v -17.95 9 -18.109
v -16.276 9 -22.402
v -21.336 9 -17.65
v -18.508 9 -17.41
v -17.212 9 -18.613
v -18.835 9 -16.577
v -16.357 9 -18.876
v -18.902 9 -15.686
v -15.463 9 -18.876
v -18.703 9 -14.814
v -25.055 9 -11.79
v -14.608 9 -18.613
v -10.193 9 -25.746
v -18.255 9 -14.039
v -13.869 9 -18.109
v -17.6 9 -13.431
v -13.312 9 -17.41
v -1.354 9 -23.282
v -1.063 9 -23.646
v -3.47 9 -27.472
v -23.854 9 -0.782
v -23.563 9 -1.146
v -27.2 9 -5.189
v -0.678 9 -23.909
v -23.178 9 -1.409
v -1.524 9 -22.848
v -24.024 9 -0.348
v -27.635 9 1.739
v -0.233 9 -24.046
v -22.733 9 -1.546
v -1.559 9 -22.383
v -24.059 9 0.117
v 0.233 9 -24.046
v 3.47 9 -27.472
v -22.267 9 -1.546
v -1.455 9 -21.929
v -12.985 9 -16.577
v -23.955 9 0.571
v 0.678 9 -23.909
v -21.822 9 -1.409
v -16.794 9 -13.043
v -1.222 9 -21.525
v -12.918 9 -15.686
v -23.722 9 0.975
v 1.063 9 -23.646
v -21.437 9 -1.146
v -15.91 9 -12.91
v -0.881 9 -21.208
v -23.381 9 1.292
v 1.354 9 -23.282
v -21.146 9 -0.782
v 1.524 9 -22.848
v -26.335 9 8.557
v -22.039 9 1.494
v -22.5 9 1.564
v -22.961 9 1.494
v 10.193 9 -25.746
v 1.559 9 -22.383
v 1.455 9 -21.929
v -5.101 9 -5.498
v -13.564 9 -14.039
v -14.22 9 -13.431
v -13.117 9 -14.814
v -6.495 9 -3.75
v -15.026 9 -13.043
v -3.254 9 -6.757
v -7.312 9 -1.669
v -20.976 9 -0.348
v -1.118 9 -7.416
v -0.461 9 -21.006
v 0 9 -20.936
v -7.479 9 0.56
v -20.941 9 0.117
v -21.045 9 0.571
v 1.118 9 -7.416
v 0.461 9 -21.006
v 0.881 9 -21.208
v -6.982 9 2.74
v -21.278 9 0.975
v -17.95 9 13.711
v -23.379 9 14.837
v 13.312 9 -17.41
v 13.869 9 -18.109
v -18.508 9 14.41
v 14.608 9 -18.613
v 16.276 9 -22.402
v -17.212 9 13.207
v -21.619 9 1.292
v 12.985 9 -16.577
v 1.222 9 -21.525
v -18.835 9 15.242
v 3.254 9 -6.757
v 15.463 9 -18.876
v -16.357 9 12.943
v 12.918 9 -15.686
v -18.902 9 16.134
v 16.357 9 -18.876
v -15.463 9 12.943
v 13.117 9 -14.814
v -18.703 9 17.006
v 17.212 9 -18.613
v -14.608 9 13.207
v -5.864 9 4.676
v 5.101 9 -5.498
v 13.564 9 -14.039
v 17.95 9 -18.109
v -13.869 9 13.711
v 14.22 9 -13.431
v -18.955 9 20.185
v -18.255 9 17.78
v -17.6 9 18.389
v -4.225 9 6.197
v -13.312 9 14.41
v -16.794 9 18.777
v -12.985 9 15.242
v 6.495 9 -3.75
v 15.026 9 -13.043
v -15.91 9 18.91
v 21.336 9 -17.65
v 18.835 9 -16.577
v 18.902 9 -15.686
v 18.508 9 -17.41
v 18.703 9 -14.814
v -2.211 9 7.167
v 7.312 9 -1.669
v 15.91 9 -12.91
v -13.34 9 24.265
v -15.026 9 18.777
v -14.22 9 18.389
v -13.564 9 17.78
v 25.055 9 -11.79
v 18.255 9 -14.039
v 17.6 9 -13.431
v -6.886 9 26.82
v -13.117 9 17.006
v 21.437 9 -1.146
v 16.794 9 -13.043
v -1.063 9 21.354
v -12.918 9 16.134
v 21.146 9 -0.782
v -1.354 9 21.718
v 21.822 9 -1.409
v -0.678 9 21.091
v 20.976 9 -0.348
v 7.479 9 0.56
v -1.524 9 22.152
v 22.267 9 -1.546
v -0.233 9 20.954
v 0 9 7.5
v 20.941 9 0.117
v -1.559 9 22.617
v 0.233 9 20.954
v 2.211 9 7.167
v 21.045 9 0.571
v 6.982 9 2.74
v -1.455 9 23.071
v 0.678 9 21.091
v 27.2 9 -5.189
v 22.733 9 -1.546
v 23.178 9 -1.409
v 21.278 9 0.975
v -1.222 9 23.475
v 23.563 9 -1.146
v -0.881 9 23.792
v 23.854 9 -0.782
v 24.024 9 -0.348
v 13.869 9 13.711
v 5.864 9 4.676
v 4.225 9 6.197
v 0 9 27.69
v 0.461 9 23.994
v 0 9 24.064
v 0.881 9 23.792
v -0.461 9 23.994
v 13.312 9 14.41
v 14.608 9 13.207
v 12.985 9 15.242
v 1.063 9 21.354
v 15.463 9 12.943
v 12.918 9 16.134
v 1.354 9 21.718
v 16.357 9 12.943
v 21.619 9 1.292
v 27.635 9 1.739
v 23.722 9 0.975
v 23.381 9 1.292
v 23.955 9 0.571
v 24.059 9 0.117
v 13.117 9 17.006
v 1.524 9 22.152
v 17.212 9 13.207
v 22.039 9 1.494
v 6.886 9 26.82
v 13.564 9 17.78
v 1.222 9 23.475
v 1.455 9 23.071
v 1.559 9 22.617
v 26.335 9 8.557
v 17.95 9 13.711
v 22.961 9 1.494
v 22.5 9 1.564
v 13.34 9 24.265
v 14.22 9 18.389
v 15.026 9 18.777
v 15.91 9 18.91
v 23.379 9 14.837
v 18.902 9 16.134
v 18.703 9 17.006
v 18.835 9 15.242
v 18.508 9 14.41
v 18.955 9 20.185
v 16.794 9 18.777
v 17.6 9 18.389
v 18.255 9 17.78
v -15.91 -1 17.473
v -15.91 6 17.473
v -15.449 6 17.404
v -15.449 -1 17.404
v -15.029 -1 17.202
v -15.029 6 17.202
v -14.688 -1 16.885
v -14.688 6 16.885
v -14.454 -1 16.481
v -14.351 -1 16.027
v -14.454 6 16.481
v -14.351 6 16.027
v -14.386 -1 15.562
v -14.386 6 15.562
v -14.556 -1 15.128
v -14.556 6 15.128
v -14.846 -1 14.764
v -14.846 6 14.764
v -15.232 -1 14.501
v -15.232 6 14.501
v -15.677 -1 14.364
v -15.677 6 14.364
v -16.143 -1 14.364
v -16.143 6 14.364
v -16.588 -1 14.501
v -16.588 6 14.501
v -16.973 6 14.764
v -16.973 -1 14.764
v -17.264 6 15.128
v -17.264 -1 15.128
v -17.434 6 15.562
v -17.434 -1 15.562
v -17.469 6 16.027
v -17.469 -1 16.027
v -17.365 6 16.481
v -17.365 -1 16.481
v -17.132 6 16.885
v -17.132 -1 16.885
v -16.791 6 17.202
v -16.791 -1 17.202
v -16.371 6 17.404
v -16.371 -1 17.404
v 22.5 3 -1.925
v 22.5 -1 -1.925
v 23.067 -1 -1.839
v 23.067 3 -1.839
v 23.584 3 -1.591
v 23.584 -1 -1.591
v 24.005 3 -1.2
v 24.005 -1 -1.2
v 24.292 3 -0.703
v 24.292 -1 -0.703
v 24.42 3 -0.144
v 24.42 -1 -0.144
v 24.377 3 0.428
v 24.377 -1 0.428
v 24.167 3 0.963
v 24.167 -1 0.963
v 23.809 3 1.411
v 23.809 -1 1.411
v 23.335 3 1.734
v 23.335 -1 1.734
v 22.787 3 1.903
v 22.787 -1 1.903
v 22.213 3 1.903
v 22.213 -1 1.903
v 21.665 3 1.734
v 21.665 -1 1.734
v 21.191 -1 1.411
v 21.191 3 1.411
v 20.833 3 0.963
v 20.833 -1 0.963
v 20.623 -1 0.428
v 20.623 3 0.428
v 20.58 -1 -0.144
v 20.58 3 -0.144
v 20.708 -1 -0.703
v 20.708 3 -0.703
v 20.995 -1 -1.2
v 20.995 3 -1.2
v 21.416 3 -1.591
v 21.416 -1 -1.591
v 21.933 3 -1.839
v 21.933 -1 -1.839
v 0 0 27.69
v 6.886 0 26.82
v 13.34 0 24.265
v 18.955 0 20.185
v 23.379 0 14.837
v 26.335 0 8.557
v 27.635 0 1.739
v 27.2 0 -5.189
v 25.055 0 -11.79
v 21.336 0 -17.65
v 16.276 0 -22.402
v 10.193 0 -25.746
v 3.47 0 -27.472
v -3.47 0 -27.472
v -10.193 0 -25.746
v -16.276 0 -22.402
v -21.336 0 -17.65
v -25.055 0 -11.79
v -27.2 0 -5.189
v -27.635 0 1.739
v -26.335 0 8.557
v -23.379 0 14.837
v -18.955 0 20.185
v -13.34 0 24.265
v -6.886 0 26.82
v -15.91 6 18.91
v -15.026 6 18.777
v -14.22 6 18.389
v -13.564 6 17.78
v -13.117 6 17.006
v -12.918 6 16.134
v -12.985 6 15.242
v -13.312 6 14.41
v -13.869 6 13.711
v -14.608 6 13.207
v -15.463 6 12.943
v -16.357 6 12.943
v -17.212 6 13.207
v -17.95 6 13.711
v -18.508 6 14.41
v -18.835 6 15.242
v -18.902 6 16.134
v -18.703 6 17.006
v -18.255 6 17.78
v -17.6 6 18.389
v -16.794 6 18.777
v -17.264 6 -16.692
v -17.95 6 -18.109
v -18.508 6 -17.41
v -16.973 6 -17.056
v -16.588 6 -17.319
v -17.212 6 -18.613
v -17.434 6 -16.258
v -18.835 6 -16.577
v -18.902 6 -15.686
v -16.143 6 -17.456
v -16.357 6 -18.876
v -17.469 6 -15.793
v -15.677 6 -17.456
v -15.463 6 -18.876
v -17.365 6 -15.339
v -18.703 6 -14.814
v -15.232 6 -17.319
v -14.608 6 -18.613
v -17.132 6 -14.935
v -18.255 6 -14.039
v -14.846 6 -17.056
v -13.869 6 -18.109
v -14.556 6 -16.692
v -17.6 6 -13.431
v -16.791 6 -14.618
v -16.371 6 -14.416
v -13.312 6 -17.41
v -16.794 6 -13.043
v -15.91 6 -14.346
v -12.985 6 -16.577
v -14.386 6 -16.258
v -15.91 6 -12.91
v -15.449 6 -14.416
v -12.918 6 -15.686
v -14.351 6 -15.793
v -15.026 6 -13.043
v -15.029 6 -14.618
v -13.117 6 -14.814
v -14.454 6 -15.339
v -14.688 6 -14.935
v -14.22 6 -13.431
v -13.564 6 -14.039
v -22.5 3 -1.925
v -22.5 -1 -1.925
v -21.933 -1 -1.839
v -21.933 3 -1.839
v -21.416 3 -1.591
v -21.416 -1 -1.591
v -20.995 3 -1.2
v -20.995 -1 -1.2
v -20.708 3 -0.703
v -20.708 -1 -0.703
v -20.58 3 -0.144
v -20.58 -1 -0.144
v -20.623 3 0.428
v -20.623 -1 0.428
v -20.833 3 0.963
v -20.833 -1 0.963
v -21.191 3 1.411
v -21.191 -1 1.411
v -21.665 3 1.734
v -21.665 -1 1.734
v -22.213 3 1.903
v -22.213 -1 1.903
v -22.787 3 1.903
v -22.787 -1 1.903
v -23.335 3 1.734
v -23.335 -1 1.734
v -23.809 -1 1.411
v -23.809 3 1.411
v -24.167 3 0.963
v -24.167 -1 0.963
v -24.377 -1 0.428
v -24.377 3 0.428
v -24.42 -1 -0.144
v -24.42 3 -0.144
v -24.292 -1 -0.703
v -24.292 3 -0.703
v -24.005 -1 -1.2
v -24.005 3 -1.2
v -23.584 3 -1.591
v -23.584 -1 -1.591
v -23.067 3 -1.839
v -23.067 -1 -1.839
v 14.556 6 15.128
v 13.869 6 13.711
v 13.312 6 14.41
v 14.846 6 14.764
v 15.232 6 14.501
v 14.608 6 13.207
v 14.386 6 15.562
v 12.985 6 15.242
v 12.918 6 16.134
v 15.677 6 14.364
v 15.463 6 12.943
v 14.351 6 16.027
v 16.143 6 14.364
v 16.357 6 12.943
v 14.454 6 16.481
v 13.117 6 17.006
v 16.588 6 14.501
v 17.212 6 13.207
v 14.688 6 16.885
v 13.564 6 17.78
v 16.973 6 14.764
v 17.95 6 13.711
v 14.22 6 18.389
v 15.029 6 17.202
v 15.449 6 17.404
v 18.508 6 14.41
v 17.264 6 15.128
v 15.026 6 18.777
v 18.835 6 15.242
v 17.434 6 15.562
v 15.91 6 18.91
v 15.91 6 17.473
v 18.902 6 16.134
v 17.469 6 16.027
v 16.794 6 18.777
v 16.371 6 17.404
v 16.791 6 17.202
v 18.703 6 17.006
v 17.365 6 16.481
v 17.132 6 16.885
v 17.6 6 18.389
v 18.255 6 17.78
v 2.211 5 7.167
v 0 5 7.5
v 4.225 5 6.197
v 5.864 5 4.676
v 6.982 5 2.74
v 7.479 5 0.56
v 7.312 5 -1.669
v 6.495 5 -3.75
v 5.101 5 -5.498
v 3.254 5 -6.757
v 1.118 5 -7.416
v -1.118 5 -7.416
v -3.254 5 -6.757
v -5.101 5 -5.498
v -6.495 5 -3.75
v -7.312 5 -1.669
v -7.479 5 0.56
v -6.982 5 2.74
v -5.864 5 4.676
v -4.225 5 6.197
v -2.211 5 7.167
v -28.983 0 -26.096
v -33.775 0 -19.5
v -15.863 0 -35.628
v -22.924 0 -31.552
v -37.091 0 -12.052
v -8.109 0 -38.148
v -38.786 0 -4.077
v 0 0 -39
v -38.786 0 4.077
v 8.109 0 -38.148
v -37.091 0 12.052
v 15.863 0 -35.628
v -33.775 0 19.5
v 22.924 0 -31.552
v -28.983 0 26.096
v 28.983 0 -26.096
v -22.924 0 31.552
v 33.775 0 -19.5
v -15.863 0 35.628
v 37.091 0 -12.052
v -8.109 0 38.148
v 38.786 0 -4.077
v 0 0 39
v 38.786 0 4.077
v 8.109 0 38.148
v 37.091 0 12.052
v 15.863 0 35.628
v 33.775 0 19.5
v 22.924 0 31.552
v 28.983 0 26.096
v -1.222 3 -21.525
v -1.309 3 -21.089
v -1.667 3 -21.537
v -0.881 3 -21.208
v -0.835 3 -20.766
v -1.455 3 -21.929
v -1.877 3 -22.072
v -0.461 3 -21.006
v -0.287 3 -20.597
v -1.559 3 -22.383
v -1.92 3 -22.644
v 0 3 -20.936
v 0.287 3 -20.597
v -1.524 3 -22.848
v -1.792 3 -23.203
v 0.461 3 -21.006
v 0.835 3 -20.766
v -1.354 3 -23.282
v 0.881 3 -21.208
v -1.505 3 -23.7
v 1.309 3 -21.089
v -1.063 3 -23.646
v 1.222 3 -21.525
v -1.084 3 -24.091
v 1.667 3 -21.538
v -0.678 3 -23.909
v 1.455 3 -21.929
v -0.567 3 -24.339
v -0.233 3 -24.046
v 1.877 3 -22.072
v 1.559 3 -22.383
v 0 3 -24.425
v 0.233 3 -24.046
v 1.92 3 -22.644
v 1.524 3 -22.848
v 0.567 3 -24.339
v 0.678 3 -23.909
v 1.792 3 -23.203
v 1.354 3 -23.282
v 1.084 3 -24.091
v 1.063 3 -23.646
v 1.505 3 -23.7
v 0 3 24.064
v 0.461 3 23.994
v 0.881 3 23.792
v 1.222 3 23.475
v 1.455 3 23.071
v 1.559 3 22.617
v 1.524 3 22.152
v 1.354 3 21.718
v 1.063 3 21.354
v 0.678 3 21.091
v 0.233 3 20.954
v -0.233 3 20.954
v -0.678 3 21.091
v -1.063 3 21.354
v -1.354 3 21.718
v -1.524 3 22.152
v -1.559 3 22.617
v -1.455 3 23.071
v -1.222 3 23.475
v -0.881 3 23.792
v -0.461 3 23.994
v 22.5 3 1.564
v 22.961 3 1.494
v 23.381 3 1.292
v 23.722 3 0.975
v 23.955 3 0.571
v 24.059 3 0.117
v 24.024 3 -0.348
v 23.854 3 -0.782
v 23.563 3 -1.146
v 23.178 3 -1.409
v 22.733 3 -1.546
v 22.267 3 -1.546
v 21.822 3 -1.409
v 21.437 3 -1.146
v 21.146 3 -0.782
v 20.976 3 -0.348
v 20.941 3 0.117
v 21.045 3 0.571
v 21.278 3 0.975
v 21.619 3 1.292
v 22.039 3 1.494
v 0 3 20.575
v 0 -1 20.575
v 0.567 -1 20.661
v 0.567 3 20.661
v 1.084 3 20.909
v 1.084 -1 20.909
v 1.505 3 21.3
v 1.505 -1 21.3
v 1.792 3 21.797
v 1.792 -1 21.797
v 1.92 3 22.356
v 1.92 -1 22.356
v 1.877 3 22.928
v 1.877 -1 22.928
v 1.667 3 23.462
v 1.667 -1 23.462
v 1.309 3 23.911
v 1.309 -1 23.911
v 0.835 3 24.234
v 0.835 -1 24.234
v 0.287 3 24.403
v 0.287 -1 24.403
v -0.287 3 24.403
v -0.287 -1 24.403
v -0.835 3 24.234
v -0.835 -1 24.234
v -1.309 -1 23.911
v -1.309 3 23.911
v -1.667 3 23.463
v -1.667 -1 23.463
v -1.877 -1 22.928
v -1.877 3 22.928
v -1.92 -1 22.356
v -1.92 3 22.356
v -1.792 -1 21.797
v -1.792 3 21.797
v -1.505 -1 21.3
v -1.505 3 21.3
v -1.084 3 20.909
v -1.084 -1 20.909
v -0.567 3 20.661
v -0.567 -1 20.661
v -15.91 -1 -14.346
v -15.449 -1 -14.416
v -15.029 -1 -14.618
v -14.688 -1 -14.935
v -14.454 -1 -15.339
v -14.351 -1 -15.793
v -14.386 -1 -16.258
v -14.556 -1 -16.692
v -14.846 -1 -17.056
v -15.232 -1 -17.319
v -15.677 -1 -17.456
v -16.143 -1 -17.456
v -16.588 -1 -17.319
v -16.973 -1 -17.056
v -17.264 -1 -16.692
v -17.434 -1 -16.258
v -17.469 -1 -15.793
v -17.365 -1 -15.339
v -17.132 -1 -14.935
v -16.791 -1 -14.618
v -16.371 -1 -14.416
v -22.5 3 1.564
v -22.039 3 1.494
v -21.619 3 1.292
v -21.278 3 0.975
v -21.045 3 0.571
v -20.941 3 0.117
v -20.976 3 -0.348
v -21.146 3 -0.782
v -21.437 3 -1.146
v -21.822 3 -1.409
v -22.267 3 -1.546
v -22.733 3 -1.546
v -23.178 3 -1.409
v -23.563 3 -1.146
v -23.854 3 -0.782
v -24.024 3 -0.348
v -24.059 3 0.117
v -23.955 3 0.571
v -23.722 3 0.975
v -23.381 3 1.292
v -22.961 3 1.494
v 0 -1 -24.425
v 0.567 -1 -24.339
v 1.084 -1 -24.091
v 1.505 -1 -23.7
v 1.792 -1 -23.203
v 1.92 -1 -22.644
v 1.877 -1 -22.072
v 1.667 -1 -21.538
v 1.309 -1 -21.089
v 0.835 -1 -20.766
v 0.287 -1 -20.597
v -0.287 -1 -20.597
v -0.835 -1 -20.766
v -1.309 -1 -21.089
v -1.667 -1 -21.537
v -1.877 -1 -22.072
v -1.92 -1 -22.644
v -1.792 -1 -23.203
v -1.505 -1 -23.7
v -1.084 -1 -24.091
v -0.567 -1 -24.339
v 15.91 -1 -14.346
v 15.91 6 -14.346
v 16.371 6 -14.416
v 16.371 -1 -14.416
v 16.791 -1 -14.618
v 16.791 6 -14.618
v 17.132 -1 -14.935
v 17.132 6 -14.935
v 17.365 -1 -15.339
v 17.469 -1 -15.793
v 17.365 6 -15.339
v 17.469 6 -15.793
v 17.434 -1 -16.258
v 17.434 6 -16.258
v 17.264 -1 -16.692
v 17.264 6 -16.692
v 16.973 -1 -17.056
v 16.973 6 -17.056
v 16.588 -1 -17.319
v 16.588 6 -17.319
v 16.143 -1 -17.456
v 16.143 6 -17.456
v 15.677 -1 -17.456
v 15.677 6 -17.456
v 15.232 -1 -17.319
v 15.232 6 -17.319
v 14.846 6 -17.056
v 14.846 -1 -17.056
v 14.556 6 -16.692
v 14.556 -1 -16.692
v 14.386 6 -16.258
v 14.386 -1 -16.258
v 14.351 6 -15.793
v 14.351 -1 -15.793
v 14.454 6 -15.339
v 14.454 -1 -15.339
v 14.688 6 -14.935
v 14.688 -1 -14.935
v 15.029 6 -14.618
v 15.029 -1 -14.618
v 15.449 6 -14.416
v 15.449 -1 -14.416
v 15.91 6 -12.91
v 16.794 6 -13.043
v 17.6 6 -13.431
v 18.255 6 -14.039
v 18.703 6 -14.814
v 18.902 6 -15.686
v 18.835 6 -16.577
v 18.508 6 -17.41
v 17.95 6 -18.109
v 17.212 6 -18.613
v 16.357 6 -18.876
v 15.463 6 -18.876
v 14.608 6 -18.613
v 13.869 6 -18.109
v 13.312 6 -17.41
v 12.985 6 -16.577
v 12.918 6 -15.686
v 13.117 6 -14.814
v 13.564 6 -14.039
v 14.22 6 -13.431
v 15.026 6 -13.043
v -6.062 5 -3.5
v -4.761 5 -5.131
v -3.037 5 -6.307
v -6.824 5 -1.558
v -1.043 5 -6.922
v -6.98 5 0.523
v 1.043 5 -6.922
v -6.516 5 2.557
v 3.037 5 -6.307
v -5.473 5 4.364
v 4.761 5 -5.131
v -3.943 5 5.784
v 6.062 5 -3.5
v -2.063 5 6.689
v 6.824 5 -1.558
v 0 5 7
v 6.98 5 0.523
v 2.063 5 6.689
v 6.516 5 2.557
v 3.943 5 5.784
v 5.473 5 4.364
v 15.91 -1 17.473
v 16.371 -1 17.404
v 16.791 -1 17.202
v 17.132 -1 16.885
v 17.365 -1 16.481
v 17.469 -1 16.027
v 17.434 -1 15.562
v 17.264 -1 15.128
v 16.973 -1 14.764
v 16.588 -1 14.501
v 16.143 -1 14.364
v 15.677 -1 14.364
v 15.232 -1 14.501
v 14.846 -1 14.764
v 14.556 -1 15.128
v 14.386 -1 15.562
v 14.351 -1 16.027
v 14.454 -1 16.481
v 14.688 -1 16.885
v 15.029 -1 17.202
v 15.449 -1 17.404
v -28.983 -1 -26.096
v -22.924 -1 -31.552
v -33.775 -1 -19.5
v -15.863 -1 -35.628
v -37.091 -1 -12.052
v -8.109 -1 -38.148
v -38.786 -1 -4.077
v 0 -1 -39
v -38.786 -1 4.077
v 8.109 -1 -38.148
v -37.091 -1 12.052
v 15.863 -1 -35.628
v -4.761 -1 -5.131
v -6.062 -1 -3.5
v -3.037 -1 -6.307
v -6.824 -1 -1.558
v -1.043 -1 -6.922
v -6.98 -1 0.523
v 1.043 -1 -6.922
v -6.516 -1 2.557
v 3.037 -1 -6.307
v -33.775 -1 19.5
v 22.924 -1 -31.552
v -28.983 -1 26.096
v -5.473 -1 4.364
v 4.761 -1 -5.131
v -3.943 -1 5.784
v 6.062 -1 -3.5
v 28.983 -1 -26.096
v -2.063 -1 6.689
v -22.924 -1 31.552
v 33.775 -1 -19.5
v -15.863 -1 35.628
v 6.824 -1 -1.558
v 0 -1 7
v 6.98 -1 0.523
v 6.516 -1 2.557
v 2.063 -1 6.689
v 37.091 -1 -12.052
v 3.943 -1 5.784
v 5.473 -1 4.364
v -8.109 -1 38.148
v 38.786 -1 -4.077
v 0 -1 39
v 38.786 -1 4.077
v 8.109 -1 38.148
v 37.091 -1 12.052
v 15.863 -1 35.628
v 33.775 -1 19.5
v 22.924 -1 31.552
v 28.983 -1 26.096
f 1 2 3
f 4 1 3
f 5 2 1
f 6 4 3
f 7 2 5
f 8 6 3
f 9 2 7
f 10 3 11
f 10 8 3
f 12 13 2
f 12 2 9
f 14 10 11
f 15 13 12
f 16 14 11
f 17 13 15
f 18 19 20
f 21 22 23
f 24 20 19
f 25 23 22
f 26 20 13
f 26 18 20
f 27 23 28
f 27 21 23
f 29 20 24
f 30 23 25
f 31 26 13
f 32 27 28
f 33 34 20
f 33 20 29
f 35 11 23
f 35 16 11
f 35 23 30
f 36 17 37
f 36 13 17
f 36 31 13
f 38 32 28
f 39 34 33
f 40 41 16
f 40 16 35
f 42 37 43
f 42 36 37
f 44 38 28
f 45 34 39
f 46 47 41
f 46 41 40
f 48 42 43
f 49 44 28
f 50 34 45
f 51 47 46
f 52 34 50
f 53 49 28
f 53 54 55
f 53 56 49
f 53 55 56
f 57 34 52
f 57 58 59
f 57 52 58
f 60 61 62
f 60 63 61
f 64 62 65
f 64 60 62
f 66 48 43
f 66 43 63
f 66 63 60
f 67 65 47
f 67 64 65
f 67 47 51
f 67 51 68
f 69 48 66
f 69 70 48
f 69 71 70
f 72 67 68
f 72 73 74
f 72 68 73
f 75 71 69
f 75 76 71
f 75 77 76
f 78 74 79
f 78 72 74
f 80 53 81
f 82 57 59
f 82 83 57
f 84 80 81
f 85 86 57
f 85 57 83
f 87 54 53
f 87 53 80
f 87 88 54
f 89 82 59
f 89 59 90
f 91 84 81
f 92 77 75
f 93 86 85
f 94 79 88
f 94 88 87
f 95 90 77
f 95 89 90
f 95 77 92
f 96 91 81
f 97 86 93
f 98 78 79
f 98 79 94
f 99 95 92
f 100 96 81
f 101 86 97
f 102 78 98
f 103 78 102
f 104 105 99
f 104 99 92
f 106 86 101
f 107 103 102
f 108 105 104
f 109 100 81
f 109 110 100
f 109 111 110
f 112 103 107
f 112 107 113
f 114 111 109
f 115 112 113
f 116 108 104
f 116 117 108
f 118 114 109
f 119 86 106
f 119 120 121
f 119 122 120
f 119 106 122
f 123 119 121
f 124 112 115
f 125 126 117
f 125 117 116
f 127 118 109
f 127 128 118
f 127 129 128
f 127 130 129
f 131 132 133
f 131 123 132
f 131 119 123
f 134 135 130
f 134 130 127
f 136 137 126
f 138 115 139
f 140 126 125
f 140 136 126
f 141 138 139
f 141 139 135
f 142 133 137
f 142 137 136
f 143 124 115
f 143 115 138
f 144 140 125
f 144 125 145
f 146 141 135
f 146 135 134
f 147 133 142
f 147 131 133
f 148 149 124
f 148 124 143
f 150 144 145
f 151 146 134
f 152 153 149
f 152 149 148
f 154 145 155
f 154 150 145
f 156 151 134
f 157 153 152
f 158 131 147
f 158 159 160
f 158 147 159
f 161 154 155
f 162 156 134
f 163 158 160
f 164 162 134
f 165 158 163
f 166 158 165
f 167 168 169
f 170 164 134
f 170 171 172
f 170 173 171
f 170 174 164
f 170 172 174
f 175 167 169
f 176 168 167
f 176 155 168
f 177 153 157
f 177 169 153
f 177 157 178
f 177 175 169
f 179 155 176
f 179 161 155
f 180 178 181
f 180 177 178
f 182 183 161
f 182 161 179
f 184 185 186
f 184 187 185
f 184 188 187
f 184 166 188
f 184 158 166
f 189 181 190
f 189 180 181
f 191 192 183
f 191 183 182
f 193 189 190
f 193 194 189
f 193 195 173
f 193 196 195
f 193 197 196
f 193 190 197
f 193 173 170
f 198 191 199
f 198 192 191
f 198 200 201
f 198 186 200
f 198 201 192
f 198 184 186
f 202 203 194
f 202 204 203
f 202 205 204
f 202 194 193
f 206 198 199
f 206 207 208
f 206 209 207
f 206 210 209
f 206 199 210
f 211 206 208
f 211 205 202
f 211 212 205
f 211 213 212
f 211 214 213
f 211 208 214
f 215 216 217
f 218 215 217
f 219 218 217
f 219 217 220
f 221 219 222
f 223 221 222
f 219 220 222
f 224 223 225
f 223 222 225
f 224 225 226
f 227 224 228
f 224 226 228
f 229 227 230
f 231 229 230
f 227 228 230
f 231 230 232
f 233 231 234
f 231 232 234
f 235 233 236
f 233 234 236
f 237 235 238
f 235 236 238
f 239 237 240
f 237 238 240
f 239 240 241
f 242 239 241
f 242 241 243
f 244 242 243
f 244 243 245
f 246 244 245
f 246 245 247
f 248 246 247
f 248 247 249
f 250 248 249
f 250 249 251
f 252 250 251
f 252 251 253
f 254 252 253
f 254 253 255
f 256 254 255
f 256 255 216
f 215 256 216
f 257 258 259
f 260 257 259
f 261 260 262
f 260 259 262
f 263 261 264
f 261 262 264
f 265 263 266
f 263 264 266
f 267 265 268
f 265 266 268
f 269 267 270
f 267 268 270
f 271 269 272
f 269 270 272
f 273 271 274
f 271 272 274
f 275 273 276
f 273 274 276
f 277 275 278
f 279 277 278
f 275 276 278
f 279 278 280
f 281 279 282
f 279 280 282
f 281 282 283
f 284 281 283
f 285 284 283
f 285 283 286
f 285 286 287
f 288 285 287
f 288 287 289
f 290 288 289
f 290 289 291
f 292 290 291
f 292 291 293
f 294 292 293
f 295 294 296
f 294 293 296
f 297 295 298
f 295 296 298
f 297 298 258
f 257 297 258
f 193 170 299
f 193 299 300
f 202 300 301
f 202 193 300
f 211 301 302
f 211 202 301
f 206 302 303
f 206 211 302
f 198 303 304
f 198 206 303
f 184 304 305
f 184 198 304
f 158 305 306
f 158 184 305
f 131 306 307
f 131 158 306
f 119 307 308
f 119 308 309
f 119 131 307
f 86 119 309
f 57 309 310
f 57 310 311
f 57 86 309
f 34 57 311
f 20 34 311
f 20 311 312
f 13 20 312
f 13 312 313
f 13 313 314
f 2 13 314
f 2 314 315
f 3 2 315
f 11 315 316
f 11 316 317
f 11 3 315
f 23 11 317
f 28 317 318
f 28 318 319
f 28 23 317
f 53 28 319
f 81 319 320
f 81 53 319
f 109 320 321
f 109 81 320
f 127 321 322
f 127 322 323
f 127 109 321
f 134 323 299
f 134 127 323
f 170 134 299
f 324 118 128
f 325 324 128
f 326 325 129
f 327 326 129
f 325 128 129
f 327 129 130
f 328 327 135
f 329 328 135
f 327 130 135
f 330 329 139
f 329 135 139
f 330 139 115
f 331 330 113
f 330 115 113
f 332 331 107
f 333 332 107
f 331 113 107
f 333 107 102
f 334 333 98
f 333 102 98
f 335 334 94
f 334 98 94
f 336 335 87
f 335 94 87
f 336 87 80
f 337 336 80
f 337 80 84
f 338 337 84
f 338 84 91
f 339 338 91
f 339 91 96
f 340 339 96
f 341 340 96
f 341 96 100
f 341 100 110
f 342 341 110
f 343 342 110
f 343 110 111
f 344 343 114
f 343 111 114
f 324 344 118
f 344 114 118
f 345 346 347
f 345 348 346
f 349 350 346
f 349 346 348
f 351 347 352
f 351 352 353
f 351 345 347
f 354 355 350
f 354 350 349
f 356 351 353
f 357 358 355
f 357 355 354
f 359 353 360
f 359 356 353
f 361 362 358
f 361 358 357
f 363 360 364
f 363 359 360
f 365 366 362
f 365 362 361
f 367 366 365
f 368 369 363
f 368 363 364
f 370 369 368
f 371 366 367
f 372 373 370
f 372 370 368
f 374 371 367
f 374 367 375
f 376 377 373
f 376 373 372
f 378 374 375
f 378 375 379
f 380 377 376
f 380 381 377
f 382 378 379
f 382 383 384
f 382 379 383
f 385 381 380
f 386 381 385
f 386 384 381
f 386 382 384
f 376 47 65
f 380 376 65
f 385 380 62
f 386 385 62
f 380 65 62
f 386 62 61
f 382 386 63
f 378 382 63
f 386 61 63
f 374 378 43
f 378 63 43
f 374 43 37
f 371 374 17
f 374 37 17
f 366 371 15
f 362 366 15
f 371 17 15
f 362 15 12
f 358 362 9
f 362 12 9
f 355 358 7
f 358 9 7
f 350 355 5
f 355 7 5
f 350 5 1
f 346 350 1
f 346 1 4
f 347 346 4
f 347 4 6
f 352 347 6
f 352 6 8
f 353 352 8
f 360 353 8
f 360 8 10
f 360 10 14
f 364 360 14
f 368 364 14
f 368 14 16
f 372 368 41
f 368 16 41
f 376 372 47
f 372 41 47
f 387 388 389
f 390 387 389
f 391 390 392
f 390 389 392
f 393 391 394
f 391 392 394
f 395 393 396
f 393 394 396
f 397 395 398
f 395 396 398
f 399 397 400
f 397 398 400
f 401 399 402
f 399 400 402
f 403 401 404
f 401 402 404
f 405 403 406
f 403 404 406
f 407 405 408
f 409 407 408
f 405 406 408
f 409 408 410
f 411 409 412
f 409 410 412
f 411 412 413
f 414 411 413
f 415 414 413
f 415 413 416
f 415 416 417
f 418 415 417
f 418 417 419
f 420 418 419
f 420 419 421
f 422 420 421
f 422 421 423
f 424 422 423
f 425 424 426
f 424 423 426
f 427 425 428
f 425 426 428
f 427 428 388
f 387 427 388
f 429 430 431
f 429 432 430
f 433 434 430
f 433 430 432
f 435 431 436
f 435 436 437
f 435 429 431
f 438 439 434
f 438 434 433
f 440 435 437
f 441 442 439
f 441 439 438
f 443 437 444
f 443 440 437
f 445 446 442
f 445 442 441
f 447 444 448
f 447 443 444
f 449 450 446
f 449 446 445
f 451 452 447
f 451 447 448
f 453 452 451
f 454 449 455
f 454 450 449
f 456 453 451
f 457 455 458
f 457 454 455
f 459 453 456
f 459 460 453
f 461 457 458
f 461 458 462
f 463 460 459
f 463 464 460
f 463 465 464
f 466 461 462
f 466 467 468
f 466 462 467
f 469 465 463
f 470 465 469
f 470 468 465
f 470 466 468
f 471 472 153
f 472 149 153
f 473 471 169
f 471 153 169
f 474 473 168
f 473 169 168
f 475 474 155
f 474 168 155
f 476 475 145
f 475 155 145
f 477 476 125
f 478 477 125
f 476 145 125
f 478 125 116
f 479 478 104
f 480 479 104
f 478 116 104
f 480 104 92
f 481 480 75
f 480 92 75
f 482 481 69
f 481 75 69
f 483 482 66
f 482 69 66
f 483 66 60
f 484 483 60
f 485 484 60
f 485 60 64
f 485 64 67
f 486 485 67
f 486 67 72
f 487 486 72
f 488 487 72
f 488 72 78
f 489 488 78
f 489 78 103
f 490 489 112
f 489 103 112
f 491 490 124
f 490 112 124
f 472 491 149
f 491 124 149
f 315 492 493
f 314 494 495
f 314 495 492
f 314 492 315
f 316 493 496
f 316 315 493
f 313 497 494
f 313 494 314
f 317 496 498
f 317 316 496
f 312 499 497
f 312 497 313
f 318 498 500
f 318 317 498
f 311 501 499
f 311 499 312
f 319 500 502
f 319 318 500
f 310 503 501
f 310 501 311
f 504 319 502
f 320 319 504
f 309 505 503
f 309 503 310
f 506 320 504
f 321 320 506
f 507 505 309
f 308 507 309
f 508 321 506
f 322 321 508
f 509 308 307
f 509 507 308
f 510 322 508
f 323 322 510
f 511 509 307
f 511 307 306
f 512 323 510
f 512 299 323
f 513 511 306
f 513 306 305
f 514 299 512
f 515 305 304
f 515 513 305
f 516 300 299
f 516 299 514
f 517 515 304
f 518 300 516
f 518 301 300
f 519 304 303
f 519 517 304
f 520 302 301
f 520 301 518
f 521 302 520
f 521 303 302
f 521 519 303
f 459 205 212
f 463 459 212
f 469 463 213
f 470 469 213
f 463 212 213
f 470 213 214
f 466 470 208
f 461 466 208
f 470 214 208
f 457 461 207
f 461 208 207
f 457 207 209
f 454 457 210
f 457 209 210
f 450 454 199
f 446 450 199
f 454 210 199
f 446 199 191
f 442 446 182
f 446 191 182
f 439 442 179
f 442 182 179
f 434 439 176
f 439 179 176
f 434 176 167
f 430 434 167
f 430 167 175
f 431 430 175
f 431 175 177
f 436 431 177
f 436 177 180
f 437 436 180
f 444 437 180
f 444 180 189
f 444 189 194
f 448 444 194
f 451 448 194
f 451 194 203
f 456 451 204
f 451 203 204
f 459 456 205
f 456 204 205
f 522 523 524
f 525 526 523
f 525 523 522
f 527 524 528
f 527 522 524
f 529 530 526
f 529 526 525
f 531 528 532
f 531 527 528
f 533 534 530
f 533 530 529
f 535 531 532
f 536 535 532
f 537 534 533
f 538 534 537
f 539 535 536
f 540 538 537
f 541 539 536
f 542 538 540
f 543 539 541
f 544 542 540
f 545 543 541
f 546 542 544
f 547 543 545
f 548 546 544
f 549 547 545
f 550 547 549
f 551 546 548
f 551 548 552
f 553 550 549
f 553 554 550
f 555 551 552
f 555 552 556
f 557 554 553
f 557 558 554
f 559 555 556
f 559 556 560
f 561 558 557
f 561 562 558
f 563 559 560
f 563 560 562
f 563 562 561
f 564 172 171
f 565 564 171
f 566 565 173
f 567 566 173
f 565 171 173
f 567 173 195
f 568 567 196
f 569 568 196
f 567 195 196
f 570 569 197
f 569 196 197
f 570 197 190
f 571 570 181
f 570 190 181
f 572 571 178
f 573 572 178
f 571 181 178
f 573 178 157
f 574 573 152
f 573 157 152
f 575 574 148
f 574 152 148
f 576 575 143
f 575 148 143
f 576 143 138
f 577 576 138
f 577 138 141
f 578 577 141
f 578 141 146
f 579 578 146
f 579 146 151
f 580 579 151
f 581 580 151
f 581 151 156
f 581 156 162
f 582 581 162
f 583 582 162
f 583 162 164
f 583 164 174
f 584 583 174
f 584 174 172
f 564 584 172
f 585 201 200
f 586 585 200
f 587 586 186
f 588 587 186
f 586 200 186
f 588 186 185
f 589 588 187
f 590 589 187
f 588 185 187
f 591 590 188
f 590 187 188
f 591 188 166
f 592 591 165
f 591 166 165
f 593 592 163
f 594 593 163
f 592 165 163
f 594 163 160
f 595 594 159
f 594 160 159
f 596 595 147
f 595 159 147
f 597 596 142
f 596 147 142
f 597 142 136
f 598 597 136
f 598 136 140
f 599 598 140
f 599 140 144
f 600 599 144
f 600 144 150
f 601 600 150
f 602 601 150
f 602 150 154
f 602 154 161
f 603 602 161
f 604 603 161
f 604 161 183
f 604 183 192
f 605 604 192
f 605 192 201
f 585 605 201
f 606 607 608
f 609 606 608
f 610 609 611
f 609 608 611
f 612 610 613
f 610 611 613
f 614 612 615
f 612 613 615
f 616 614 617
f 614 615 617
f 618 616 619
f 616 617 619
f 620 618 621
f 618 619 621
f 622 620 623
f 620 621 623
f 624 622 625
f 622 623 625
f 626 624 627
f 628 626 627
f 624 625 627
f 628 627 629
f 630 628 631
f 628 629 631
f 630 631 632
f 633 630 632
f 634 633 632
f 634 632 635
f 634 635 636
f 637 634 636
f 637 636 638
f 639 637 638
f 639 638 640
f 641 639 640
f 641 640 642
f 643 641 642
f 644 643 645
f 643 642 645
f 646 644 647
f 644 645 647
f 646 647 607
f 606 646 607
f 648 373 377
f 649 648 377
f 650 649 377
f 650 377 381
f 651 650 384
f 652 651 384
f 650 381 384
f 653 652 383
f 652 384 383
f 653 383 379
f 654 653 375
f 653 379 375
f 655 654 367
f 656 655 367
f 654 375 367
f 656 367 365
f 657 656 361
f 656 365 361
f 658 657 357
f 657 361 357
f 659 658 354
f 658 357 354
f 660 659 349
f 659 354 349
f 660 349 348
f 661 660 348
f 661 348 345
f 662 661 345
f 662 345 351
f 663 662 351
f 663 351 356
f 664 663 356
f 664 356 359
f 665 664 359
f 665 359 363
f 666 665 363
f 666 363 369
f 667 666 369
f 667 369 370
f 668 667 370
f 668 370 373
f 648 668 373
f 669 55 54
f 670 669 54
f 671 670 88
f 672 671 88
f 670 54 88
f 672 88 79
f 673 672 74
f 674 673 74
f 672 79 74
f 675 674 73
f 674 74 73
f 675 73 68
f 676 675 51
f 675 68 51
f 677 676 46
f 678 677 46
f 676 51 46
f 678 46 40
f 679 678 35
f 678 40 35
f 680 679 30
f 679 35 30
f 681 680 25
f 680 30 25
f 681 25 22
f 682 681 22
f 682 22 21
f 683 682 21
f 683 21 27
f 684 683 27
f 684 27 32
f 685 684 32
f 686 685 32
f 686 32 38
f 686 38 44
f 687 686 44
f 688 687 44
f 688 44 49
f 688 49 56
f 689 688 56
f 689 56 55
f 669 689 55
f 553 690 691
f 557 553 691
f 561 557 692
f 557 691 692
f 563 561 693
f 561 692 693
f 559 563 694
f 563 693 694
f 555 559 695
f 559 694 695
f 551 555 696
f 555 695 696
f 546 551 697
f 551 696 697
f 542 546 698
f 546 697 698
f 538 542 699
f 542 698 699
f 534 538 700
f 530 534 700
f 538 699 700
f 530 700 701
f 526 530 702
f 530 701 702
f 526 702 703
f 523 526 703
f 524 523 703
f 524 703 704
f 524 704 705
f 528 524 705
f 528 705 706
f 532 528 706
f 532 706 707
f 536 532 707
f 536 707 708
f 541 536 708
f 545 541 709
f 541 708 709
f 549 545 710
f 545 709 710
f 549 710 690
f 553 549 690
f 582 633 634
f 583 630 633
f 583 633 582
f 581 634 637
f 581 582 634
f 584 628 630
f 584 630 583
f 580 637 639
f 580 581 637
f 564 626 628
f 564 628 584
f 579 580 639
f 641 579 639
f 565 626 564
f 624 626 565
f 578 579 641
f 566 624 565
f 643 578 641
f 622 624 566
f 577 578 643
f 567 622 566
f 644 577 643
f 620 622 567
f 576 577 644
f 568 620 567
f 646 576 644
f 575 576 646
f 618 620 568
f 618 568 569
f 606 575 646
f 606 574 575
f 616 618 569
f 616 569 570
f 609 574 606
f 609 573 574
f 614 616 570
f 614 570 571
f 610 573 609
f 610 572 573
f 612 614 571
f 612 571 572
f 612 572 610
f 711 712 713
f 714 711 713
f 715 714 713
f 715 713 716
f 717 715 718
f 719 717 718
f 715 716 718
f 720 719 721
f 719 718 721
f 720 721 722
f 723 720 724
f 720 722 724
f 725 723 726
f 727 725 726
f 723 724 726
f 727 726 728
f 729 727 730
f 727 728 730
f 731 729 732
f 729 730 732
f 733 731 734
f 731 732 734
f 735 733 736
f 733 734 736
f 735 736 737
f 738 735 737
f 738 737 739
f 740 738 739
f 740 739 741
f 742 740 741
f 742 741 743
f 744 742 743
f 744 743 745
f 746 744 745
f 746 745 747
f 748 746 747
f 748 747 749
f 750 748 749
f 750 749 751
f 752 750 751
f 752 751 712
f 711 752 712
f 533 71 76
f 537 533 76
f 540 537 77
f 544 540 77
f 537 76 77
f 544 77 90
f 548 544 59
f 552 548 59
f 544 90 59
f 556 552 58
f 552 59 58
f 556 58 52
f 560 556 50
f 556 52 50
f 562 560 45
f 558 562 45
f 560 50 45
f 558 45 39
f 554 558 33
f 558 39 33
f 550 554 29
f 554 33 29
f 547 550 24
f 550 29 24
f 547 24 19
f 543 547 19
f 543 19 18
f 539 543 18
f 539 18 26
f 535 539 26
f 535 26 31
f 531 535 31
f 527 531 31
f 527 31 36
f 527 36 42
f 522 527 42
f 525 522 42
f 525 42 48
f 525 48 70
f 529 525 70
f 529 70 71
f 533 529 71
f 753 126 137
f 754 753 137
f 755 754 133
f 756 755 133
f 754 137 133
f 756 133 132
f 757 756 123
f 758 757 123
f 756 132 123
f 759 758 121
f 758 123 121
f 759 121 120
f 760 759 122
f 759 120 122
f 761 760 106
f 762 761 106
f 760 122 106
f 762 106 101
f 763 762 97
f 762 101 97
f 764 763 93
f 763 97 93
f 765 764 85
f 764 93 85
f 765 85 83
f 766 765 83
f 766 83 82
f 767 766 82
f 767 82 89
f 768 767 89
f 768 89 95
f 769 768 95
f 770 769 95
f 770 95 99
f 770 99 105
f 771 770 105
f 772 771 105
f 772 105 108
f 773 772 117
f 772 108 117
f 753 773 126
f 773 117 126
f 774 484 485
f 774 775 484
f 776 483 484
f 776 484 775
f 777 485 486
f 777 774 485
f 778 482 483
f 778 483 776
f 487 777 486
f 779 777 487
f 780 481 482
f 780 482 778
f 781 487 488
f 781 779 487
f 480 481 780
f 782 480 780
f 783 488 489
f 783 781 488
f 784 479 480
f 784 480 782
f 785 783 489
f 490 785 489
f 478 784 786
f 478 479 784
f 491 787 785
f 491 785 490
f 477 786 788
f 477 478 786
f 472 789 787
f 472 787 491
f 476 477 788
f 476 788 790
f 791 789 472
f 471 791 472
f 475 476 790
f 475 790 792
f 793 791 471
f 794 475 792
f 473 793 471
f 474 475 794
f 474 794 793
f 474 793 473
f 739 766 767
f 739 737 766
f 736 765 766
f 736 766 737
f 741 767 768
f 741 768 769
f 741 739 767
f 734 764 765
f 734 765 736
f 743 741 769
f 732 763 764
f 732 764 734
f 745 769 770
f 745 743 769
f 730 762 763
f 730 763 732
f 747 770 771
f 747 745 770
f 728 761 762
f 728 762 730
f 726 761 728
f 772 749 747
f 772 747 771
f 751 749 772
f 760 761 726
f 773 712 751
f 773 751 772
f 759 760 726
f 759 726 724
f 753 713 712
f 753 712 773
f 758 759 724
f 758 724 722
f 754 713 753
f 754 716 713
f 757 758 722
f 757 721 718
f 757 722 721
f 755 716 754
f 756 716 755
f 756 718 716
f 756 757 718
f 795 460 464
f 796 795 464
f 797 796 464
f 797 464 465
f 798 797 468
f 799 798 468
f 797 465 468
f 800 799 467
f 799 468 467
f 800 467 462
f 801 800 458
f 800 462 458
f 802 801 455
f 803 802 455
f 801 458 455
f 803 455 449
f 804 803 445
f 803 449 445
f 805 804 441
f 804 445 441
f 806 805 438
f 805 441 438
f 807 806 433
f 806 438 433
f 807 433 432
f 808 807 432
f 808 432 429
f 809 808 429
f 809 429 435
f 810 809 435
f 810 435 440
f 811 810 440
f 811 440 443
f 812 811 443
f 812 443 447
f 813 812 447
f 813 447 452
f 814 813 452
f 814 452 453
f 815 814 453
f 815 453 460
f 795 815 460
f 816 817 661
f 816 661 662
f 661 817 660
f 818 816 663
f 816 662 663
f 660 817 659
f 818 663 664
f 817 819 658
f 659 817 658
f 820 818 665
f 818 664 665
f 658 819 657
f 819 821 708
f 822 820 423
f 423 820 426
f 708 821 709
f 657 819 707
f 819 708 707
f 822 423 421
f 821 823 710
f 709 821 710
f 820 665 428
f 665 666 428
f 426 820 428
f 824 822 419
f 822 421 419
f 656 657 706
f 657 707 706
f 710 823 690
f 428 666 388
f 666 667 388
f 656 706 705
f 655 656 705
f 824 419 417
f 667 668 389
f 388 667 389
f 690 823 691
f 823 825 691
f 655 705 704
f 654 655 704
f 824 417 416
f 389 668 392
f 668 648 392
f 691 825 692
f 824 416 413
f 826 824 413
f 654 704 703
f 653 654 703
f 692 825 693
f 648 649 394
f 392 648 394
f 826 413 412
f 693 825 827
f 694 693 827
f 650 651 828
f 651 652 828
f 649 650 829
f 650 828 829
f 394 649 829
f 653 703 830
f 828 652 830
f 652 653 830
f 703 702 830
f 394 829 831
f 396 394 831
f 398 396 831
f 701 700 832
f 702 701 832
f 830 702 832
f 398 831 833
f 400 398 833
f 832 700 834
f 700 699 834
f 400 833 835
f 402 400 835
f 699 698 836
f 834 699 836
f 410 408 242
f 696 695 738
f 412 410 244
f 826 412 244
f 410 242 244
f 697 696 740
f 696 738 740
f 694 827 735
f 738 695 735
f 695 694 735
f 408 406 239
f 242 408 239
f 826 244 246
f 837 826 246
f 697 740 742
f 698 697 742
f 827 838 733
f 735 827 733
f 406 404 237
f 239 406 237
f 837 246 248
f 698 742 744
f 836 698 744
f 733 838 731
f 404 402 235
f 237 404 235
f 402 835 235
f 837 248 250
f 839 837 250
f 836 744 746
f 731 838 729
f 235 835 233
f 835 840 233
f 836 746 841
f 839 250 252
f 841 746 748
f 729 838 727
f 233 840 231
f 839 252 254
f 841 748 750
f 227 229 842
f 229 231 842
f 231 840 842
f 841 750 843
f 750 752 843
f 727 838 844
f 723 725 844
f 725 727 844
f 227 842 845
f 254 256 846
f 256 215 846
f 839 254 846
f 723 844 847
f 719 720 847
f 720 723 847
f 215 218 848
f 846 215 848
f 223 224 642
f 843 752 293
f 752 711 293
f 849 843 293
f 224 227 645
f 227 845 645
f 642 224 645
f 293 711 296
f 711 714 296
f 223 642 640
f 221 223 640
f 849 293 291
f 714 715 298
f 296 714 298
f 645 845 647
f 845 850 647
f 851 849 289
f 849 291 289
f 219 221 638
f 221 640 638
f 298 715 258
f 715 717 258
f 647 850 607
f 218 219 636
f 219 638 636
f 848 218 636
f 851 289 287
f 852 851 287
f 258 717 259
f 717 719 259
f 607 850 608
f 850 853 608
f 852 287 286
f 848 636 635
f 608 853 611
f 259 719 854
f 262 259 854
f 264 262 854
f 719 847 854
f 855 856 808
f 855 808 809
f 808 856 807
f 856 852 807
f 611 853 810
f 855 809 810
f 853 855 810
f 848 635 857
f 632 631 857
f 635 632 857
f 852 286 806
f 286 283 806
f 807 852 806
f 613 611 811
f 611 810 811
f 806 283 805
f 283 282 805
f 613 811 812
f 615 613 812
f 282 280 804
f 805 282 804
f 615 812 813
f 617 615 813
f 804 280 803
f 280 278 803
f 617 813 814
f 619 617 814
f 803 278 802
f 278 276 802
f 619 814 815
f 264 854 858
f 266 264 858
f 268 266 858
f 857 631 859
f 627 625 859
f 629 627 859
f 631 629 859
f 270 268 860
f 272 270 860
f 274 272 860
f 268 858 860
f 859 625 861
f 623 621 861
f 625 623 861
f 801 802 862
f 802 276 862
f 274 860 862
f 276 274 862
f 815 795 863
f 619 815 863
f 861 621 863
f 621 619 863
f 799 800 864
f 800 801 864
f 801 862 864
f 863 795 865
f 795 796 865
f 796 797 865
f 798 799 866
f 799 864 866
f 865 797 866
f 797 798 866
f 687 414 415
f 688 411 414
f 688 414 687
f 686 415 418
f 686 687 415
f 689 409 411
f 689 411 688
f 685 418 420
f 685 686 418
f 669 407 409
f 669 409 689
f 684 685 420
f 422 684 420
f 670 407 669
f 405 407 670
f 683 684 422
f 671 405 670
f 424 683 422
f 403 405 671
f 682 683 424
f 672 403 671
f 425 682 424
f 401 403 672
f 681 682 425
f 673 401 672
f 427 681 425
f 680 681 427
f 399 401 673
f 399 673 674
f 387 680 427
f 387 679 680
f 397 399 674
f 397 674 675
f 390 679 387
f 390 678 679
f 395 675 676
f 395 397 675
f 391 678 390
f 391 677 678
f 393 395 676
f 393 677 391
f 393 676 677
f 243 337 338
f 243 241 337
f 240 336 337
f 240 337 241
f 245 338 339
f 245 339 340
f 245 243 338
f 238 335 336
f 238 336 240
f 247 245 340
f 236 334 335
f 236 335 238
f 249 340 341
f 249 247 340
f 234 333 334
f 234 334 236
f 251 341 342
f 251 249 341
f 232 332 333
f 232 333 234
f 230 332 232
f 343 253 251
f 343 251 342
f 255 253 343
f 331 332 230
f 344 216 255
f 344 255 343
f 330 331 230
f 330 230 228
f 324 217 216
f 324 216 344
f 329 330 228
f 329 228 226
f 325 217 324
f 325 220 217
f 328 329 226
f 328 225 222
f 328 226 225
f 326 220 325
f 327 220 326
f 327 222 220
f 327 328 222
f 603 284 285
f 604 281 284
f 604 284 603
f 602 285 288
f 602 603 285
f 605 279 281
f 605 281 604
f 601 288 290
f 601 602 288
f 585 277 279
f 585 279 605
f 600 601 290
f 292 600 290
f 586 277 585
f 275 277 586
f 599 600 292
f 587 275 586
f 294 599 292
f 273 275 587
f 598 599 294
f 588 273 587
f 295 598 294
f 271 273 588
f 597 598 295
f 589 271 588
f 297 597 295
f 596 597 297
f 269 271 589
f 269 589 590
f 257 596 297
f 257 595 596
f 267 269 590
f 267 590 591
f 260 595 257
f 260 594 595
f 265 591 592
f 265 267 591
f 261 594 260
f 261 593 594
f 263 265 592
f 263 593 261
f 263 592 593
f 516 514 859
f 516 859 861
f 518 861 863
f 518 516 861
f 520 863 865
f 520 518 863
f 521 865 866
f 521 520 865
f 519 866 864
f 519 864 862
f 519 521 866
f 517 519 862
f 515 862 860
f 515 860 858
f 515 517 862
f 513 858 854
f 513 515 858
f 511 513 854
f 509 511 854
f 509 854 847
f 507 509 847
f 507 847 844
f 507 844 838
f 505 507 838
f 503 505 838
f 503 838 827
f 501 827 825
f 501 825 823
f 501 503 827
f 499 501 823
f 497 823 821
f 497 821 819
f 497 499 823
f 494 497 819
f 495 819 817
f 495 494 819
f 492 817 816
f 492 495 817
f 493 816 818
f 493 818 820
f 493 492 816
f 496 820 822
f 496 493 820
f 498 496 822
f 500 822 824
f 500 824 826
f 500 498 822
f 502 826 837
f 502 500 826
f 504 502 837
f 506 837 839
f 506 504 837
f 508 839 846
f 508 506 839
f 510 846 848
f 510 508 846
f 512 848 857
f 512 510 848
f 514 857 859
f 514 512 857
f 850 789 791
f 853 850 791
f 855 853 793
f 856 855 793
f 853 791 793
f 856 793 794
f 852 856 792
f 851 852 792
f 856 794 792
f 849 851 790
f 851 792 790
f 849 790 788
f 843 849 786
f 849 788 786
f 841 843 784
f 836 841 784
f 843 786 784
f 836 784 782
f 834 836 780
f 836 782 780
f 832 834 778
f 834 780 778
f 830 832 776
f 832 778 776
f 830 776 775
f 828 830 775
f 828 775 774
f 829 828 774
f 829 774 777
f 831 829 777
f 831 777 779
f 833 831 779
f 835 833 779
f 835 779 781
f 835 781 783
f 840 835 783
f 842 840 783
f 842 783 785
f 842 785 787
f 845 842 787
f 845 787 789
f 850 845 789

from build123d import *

# Parameters (mm, degrees)
SKETCH1_R           = 39
SKETCH1_R_2         = 1.5635
SKETCH1_R_3         = 7.5
BOSS_EXTRUDE1_DEPTH = 1
BOSS_EXTRUDE2_START = 9
SKETCH1_3_R         = 27.69
SKETCH1_3_R_2       = 1.5635
SKETCH1_3_R_3       = 7.5
BOSS_EXTRUDE2_DEPTH = 9
SKETCH2_R           = 3
SKETCH2_R_2         = 1.5635
CUT_EXTRUDE1_DEPTH  = 3
SKETCH1_4_R         = 7.5
SKETCH1_4_R_2       = 7
BOSS_EXTRUDE3_DEPTH = 1
BOSS_EXTRUDE4_START = 5
SKETCH1_5_R         = 7.5
SKETCH1_5_R_2       = 7
BOSS_EXTRUDE4_DEPTH = 5
SKETCH3_R           = 1.925
CUT_EXTRUDE2_DEPTH  = 4


with BuildPart() as part:
    # Sketch1 → Boss-Extrude1 (new body)
    with BuildSketch(Plane(origin=(0, 0, 0), x_dir=(1, 0, 0), z_dir=(0, 1, 0))):
        Circle(SKETCH1_R)
        with Locations((22.5, 0)):
            Circle(SKETCH1_R_2, mode=Mode.SUBTRACT)
        with Locations((-15.909902577, -15.909902577)):
            Circle(SKETCH1_R_2, mode=Mode.SUBTRACT)
        with Locations((0, -22.5)):
            Circle(SKETCH1_R_2, mode=Mode.SUBTRACT)
        with Locations((15.909902577, -15.909902577)):
            Circle(SKETCH1_R_2, mode=Mode.SUBTRACT)
        with Locations((-22.5, 0)):
            Circle(SKETCH1_R_2, mode=Mode.SUBTRACT)
        with Locations((-15.909902577, 15.909902577)):
            Circle(SKETCH1_R_2, mode=Mode.SUBTRACT)
        with Locations((0, 22.5)):
            Circle(SKETCH1_R_2, mode=Mode.SUBTRACT)
        Circle(SKETCH1_R_3, mode=Mode.SUBTRACT)
        with Locations((15.909902577, 15.909902577)):
            Circle(SKETCH1_R_2, mode=Mode.SUBTRACT)
    extrude(amount=-BOSS_EXTRUDE1_DEPTH)

    # Sketch1<3> → Boss-Extrude2 (add)
    with BuildSketch(Plane(origin=(0, 0, 0), x_dir=(1, 0, 0), z_dir=(0, 1, 0)).offset(BOSS_EXTRUDE2_START)):
        Circle(SKETCH1_3_R)
        with Locations((-15.909902577, -15.909902577)):
            Circle(SKETCH1_3_R_2, mode=Mode.SUBTRACT)
        with Locations((0, -22.5)):
            Circle(SKETCH1_3_R_2, mode=Mode.SUBTRACT)
        with Locations((15.909902577, -15.909902577)):
            Circle(SKETCH1_3_R_2, mode=Mode.SUBTRACT)
        with Locations((-22.5, 0)):
            Circle(SKETCH1_3_R_2, mode=Mode.SUBTRACT)
        with Locations((-15.909902577, 15.909902577)):
            Circle(SKETCH1_3_R_2, mode=Mode.SUBTRACT)
        with Locations((0, 22.5)):
            Circle(SKETCH1_3_R_2, mode=Mode.SUBTRACT)
        Circle(SKETCH1_3_R_3, mode=Mode.SUBTRACT)
        with Locations((15.909902577, 15.909902577)):
            Circle(SKETCH1_3_R_2, mode=Mode.SUBTRACT)
        with Locations((22.5, 0)):
            Circle(SKETCH1_3_R_2, mode=Mode.SUBTRACT)
    extrude(amount=-BOSS_EXTRUDE2_DEPTH)

    # Sketch2 → Cut-Extrude1 (cut)
    # profile 1 of 4: a face of its own
    with BuildSketch(Plane(origin=(0, 9, 0), x_dir=(1, 0, 0), z_dir=(0, 1, 0))):
        with Locations((15.909902577, 15.909902577)):
            Circle(SKETCH2_R)
        with Locations((15.909902577, 15.909902577)):
            Circle(SKETCH2_R_2, mode=Mode.SUBTRACT)
    # profile 2 of 4: a face of its own
    with BuildSketch(Plane(origin=(0, 9, 0), x_dir=(1, 0, 0), z_dir=(0, 1, 0))):
        with Locations((15.909902577, -15.909902577)):
            Circle(SKETCH2_R)
    # profile 3 of 4: a face of its own
    with BuildSketch(Plane(origin=(0, 9, 0), x_dir=(1, 0, 0), z_dir=(0, 1, 0))):
        with Locations((-15.909902577, -15.909902577)):
            Circle(SKETCH2_R)
        with Locations((-15.909902577, -15.909902577)):
            Circle(SKETCH2_R_2, mode=Mode.SUBTRACT)
    # profile 4 of 4: a face of its own
    with BuildSketch(Plane(origin=(0, 9, 0), x_dir=(1, 0, 0), z_dir=(0, 1, 0))):
        with Locations((-15.909902577, 15.909902577)):
            Circle(SKETCH2_R)
        with Locations((-15.909902577, 15.909902577)):
            Circle(SKETCH2_R_2, mode=Mode.SUBTRACT)
    extrude(amount=-CUT_EXTRUDE1_DEPTH, mode=Mode.SUBTRACT)

    # Sketch1<4> → Boss-Extrude3 (add)
    with BuildSketch(Plane(origin=(0, 0, 0), x_dir=(1, 0, 0), z_dir=(0, 1, 0))):
        Circle(SKETCH1_4_R)
        Circle(SKETCH1_4_R_2, mode=Mode.SUBTRACT)
    extrude(amount=-BOSS_EXTRUDE3_DEPTH)

    # Sketch1<5> → Boss-Extrude4 (add)
    with BuildSketch(Plane(origin=(0, 0, 0), x_dir=(1, 0, 0), z_dir=(0, 1, 0)).offset(BOSS_EXTRUDE4_START)):
        Circle(SKETCH1_5_R)
        Circle(SKETCH1_5_R_2, mode=Mode.SUBTRACT)
    extrude(amount=-BOSS_EXTRUDE4_DEPTH)

    # Sketch3 → Cut-Extrude2 (cut)
    with BuildSketch(Plane.XZ.offset(1)):
        with Locations((22.5, 0)):
            Circle(SKETCH3_R)
        with Locations((0, -22.5)):
            Circle(SKETCH3_R)
        with Locations((-22.5, 0)):
            Circle(SKETCH3_R)
        with Locations((0, 22.5)):
            Circle(SKETCH3_R)
    extrude(amount=-CUT_EXTRUDE2_DEPTH, mode=Mode.SUBTRACT)


solid = part.part
